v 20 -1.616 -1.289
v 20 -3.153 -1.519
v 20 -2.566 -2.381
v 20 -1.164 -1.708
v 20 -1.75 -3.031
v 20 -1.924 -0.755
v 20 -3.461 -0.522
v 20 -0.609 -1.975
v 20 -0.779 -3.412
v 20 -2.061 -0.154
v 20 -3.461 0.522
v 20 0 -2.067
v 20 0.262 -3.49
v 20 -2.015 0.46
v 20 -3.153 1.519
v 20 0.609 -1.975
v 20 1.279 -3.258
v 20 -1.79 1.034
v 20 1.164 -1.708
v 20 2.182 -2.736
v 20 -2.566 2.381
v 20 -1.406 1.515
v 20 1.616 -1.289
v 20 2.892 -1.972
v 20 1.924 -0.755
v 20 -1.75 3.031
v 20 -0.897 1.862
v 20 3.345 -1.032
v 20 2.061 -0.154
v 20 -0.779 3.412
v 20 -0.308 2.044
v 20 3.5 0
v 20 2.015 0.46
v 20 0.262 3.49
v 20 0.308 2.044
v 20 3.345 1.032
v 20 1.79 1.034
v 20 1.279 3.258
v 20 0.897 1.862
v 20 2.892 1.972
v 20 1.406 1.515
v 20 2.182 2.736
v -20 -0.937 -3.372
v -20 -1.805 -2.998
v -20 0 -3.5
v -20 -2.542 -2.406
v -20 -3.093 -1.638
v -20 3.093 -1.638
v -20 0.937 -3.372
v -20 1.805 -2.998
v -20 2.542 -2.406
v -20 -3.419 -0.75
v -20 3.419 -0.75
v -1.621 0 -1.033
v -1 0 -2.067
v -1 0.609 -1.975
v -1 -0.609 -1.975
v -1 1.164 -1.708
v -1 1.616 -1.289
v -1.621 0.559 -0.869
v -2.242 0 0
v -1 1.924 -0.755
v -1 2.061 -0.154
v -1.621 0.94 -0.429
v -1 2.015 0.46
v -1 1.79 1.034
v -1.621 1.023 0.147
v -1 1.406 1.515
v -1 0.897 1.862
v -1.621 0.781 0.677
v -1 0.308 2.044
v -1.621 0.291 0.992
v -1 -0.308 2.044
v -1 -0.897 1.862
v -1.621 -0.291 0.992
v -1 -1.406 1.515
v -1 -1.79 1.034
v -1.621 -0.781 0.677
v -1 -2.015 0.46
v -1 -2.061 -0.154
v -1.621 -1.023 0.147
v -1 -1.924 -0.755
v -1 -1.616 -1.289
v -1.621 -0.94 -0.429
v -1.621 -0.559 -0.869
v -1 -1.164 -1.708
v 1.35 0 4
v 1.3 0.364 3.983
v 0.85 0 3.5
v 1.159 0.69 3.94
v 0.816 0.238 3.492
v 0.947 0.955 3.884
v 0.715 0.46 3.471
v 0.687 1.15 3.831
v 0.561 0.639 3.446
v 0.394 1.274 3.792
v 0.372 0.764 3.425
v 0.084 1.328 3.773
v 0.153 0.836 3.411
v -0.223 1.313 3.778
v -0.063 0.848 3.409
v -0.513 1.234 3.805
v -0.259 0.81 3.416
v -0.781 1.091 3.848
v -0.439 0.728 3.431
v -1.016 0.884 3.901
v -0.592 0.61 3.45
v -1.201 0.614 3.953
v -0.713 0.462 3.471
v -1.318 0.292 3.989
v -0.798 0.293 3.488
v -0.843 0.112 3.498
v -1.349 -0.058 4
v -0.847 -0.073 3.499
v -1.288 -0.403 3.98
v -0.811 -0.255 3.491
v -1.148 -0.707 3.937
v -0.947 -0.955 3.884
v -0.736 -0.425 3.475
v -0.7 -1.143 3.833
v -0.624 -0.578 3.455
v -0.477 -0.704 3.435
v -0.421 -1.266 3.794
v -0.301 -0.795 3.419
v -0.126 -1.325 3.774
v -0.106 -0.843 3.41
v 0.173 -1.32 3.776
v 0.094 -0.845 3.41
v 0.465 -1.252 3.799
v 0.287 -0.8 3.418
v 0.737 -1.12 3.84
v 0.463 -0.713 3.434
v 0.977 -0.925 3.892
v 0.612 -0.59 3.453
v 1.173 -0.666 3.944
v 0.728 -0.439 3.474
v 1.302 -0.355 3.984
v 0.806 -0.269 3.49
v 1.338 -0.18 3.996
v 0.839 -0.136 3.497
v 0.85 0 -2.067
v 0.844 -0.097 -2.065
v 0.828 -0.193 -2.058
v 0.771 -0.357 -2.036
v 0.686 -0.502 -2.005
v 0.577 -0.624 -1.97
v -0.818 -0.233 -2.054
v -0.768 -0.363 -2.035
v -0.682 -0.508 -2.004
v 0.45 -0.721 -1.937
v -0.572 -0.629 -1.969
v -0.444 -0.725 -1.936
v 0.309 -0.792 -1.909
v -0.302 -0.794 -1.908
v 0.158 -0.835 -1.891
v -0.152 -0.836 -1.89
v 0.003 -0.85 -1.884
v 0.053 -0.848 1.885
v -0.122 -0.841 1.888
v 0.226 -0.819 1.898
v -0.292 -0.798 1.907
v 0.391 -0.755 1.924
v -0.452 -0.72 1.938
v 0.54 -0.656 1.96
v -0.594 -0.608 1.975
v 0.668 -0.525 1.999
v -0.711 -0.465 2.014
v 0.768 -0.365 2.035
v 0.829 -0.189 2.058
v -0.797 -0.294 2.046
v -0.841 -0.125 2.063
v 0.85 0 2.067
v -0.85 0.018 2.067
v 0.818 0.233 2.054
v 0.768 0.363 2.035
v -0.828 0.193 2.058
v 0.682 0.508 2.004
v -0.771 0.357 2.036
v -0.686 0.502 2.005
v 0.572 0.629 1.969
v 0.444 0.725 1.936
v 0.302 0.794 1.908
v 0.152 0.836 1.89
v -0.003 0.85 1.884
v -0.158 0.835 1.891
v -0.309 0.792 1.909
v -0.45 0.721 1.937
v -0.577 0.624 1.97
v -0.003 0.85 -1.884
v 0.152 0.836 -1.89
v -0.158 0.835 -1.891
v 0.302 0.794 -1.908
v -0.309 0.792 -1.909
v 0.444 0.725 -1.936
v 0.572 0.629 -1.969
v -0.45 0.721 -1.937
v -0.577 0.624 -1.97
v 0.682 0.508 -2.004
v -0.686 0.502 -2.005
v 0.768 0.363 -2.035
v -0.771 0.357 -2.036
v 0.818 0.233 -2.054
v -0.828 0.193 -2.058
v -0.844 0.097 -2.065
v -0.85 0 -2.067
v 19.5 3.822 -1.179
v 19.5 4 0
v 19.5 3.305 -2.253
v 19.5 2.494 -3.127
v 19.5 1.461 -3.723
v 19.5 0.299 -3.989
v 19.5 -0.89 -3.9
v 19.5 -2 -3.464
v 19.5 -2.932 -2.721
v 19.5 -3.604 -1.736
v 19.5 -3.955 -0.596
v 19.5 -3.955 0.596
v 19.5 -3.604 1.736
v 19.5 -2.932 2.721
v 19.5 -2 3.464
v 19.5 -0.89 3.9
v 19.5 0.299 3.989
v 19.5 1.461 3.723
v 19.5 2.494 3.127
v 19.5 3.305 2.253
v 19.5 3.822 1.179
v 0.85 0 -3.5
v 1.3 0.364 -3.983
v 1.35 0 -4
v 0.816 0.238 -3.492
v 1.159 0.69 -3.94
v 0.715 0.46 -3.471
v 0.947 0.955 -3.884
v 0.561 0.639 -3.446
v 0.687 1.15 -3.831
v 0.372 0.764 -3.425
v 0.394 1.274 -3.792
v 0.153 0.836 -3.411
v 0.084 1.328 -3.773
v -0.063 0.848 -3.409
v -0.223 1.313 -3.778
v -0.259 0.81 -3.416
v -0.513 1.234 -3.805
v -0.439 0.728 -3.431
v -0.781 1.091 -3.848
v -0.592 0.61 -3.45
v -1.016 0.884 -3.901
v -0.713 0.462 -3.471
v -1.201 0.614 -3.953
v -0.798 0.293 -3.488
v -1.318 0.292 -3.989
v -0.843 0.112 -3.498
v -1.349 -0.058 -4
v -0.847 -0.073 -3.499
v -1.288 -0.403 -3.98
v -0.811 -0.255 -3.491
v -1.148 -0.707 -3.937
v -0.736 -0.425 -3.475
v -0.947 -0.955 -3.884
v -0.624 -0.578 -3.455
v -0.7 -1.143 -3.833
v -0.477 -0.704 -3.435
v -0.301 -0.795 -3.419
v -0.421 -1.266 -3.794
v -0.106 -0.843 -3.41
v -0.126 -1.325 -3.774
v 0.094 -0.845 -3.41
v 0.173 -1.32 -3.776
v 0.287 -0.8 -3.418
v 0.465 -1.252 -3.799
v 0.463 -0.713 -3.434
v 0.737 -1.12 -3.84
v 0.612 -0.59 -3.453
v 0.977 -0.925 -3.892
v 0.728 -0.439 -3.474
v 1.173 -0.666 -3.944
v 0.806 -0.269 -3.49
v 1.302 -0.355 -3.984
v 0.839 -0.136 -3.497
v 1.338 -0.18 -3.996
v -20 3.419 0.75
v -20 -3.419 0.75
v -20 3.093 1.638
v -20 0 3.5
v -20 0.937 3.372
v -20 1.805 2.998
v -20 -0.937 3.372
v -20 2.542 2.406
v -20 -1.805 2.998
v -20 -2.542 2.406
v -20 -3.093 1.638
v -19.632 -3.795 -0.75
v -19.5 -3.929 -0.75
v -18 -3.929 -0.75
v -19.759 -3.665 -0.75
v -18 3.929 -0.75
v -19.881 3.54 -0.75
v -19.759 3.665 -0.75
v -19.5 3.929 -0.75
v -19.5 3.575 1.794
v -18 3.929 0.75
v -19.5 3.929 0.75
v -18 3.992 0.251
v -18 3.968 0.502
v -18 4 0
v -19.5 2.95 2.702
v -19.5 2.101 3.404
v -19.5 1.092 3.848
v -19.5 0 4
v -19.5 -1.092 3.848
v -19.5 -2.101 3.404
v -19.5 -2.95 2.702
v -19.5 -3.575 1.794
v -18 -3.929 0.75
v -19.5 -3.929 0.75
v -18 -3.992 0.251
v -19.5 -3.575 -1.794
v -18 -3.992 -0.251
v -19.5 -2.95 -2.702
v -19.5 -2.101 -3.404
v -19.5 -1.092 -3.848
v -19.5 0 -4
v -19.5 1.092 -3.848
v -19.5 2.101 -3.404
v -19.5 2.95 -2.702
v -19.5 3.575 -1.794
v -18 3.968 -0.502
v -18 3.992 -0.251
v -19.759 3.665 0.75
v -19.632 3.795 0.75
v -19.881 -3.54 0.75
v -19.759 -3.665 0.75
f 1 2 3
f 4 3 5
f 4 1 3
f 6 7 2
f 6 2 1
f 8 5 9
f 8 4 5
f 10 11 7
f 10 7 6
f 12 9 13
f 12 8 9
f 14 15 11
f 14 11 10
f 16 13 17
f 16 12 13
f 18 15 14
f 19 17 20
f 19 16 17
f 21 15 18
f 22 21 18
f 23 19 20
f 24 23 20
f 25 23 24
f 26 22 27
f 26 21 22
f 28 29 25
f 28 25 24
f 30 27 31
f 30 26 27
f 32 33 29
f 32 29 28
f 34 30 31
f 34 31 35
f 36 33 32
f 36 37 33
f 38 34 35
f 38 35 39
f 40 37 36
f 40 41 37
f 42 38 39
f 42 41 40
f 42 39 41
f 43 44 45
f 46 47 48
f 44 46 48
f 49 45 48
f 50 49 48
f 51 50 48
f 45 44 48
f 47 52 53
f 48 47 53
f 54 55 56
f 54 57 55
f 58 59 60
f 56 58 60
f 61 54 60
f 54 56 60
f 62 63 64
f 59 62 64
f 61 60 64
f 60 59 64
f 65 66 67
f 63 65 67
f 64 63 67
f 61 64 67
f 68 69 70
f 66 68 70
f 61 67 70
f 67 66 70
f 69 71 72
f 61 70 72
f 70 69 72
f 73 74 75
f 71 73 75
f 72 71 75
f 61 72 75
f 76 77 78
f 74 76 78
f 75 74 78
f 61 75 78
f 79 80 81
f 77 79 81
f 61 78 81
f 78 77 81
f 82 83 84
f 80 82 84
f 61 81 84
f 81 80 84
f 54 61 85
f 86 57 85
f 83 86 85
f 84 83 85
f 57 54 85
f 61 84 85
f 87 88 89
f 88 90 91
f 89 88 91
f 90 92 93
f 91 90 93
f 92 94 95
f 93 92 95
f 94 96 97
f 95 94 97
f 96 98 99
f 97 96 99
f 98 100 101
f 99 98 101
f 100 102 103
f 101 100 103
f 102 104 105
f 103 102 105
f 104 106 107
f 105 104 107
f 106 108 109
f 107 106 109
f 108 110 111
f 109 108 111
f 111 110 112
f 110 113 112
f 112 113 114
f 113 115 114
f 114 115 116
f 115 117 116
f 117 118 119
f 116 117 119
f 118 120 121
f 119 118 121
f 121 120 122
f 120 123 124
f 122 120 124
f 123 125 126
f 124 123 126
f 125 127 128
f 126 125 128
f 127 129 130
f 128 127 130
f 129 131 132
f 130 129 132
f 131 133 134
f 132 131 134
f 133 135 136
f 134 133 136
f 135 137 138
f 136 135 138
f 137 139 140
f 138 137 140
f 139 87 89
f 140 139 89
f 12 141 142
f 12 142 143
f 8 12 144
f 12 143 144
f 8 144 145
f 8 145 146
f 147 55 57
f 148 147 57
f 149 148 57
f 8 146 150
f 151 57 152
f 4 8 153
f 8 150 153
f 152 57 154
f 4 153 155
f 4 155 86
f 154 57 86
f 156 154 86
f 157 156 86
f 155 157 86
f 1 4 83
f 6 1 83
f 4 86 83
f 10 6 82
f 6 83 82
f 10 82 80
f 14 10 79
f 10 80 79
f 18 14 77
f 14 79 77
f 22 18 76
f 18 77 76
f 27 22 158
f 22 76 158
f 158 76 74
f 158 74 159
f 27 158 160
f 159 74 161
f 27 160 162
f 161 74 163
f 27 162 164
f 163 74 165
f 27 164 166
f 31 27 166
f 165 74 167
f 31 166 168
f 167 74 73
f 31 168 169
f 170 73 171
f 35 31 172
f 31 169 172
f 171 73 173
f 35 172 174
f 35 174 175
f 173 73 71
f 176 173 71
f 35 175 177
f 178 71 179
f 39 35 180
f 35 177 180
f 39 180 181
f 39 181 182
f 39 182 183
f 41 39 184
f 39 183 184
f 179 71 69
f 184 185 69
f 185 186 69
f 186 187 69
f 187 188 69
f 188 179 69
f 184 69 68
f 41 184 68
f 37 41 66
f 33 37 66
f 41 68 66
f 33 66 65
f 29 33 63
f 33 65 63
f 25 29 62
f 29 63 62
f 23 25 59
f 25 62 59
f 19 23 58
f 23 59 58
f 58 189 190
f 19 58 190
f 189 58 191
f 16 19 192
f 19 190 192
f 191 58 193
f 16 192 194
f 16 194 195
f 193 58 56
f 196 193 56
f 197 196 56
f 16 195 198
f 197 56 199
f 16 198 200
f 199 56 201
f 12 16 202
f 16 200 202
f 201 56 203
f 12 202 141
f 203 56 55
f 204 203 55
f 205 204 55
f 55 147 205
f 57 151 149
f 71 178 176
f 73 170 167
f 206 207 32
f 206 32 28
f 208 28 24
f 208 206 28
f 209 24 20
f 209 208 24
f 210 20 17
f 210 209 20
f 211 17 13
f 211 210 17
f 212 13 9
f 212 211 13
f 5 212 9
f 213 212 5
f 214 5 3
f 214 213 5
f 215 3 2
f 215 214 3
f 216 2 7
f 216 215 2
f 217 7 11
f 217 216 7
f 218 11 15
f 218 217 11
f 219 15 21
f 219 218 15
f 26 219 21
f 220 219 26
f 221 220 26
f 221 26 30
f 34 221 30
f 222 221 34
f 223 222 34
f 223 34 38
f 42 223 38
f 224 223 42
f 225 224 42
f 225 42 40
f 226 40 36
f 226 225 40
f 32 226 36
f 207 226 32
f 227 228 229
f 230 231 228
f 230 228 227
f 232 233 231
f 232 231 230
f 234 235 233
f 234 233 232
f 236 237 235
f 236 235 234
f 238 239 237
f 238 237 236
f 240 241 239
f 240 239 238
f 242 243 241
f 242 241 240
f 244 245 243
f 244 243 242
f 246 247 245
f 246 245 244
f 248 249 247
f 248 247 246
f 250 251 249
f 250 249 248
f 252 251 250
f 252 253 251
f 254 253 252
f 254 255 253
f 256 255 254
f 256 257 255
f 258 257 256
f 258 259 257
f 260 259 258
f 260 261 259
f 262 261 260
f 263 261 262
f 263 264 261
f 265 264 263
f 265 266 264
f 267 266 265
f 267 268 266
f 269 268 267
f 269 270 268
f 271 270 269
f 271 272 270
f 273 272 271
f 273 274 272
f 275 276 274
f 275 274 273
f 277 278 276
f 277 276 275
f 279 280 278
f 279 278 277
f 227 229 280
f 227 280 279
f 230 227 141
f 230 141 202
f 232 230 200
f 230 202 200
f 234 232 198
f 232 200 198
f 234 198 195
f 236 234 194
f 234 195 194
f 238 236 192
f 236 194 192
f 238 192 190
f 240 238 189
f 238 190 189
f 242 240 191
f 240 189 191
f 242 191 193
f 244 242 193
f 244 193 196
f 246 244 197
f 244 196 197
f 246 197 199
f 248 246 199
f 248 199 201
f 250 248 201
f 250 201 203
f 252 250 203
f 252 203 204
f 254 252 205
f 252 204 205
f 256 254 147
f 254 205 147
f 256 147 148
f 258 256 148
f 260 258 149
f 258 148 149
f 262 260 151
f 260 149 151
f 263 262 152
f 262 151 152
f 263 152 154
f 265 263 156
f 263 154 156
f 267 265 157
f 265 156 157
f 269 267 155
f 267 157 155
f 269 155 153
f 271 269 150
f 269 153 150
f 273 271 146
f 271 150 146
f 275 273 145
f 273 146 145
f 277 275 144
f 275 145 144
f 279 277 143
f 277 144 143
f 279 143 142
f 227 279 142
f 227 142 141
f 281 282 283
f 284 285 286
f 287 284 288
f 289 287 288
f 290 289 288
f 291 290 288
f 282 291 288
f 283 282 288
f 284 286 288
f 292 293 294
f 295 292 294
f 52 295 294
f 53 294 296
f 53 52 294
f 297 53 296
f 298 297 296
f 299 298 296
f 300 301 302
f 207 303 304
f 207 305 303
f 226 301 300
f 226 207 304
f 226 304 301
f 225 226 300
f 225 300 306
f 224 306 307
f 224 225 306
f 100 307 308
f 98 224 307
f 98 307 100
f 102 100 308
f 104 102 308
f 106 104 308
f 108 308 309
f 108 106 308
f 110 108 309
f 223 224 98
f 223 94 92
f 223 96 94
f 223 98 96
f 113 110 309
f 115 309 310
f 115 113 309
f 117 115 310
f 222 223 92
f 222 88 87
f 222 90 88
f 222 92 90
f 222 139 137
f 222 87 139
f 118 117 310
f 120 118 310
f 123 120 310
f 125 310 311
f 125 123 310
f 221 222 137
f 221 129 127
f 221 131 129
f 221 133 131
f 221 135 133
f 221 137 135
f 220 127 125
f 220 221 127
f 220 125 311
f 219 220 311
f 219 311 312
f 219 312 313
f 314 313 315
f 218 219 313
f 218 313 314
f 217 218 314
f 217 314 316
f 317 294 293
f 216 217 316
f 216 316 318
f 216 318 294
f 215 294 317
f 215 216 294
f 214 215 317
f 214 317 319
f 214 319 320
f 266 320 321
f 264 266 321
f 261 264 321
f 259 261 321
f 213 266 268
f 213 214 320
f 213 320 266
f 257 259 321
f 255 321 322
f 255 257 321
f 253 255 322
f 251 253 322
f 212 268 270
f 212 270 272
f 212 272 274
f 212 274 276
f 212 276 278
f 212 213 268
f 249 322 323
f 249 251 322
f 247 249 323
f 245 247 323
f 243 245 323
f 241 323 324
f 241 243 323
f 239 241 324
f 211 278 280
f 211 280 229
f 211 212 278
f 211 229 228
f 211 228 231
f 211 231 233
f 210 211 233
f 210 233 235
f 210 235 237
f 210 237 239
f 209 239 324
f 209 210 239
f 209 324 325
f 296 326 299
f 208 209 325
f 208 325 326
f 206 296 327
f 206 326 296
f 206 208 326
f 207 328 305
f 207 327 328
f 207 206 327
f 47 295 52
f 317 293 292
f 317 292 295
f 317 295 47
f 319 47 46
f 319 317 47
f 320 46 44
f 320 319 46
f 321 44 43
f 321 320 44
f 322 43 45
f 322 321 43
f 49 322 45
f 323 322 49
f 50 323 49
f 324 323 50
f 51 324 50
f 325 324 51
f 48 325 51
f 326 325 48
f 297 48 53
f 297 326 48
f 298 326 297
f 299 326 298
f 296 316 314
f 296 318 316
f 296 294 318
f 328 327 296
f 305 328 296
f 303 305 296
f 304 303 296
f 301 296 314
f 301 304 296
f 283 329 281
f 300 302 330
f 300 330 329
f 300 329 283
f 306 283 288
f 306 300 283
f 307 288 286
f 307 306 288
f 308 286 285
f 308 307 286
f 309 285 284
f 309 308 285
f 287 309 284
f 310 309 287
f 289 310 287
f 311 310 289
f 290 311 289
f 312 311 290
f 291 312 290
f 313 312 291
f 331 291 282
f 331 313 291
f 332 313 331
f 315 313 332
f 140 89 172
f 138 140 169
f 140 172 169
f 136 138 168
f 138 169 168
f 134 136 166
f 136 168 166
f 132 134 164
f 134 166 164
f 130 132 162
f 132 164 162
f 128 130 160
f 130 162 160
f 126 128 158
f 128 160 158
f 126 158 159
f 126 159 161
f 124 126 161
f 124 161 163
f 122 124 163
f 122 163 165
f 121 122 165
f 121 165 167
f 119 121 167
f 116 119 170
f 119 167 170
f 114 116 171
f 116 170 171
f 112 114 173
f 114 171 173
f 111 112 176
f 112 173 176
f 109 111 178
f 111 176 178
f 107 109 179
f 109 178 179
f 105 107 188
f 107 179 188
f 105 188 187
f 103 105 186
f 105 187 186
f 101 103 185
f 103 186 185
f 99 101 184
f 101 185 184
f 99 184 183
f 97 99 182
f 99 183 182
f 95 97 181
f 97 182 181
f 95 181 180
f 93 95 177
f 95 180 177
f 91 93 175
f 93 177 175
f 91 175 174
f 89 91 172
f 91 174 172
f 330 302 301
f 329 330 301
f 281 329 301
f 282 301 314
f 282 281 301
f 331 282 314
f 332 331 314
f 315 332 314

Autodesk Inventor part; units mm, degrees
ref_plane "YZ Plane" through (0, 0, 0) normal (1, 0, 0) x (0, 1, 0)
ref_plane "XZ Plane" through (0, 0, 0) normal (0, 1, 0) x (-1, 0, 0)
ref_plane "XY Plane" through (0, 0, 0) normal (0, 0, 1) x (1, 0, 0)
sketch "Skizze1" plane through (0, 0, 0) normal (0, 0, 1) x (1, 0, 0)
  line L0 (0, 0) -> (24.9383, 0)
  line L1 (20, 0) -> (-20, 0)
  line L2 (-20, 0) -> (-20, 4)
  line L3 (-20, 4) -> (20, 4)
  line L4 (20, 4) -> (20, 0)
  circle A0 centre (0, 0) radius 0.85
  dimension "d0" = 40
  dimension "d1" = 8
  dimension "d2" = 1.7
revolve "Umdrehung1" add sketch "Skizze1" angle 360 about axis through (0, 0, 0) along (1, 0, 0) picked at (-0.5584, 0.0678) contours L1 A0 L0 | A0 L1 L2 L3 L4 L0
sketch "Skizze2" plane through (0, 0, 0) normal (0, 0, 1) x (1, 0, 0)
  circle A0 centre (0, 0) radius 0.85 projected
extrude "Extrusion1" cut sketch "Skizze2" along normal through all both and the other way through all
sketch "Skizze3" plane through (20, 0, 0) normal (1, 0, 0) x (0, 0, -1)
  point P0 (0, 0)
  point P1 (0, 0)
hole "Bohrung1" at (20, 0, 0) direction (-1, 0, 0) diameter 4.134 depth 21 tip angle 118 thread size "M5x0.8" class "6H" standard "ISO Metric profile"
chamfer "Fase1" distance 0.5 angle 45 2 edges at (20, -4, 0) (-20, -4, 0)
chamfer "Fase2" distance 0.5 angle 45 2 edges at (-0.85, -0.0027, -4) (-0.85, -0.0027, 4)
sketch "Sketch4" plane through (-20, 0, 0) normal (-1, 0, 0) x (0, 0, 1)
  line L0 (0.75, -4) -> (-0.75, -4)
  line L1 (-0.75, -4) -> (-0.75, 4)
  line L2 (-0.75, 4) -> (0.75, 4)
  line L3 (0.75, 4) -> (0.75, -4)
  line L4 (0.75, -4) -> (-0.75, 4) construction
  line L5 (-0.75, -4) -> (0.75, 4) construction
  circle A0 centre (0, 0) radius 4 projected
  point P0 (0.75, 3.9291)
  point P1 (-0.75, 3.9291)
  point P2 (-0.75, -3.9291)
  point P3 (0.75, -3.9291)
  dimension "d19" = 1.5
extrude "Extrusion2" cut sketch "Sketch4" against normal blind 2 contours A0 L1 L3
properties part number "bolt_V1" material "Stahl, Legierung"
